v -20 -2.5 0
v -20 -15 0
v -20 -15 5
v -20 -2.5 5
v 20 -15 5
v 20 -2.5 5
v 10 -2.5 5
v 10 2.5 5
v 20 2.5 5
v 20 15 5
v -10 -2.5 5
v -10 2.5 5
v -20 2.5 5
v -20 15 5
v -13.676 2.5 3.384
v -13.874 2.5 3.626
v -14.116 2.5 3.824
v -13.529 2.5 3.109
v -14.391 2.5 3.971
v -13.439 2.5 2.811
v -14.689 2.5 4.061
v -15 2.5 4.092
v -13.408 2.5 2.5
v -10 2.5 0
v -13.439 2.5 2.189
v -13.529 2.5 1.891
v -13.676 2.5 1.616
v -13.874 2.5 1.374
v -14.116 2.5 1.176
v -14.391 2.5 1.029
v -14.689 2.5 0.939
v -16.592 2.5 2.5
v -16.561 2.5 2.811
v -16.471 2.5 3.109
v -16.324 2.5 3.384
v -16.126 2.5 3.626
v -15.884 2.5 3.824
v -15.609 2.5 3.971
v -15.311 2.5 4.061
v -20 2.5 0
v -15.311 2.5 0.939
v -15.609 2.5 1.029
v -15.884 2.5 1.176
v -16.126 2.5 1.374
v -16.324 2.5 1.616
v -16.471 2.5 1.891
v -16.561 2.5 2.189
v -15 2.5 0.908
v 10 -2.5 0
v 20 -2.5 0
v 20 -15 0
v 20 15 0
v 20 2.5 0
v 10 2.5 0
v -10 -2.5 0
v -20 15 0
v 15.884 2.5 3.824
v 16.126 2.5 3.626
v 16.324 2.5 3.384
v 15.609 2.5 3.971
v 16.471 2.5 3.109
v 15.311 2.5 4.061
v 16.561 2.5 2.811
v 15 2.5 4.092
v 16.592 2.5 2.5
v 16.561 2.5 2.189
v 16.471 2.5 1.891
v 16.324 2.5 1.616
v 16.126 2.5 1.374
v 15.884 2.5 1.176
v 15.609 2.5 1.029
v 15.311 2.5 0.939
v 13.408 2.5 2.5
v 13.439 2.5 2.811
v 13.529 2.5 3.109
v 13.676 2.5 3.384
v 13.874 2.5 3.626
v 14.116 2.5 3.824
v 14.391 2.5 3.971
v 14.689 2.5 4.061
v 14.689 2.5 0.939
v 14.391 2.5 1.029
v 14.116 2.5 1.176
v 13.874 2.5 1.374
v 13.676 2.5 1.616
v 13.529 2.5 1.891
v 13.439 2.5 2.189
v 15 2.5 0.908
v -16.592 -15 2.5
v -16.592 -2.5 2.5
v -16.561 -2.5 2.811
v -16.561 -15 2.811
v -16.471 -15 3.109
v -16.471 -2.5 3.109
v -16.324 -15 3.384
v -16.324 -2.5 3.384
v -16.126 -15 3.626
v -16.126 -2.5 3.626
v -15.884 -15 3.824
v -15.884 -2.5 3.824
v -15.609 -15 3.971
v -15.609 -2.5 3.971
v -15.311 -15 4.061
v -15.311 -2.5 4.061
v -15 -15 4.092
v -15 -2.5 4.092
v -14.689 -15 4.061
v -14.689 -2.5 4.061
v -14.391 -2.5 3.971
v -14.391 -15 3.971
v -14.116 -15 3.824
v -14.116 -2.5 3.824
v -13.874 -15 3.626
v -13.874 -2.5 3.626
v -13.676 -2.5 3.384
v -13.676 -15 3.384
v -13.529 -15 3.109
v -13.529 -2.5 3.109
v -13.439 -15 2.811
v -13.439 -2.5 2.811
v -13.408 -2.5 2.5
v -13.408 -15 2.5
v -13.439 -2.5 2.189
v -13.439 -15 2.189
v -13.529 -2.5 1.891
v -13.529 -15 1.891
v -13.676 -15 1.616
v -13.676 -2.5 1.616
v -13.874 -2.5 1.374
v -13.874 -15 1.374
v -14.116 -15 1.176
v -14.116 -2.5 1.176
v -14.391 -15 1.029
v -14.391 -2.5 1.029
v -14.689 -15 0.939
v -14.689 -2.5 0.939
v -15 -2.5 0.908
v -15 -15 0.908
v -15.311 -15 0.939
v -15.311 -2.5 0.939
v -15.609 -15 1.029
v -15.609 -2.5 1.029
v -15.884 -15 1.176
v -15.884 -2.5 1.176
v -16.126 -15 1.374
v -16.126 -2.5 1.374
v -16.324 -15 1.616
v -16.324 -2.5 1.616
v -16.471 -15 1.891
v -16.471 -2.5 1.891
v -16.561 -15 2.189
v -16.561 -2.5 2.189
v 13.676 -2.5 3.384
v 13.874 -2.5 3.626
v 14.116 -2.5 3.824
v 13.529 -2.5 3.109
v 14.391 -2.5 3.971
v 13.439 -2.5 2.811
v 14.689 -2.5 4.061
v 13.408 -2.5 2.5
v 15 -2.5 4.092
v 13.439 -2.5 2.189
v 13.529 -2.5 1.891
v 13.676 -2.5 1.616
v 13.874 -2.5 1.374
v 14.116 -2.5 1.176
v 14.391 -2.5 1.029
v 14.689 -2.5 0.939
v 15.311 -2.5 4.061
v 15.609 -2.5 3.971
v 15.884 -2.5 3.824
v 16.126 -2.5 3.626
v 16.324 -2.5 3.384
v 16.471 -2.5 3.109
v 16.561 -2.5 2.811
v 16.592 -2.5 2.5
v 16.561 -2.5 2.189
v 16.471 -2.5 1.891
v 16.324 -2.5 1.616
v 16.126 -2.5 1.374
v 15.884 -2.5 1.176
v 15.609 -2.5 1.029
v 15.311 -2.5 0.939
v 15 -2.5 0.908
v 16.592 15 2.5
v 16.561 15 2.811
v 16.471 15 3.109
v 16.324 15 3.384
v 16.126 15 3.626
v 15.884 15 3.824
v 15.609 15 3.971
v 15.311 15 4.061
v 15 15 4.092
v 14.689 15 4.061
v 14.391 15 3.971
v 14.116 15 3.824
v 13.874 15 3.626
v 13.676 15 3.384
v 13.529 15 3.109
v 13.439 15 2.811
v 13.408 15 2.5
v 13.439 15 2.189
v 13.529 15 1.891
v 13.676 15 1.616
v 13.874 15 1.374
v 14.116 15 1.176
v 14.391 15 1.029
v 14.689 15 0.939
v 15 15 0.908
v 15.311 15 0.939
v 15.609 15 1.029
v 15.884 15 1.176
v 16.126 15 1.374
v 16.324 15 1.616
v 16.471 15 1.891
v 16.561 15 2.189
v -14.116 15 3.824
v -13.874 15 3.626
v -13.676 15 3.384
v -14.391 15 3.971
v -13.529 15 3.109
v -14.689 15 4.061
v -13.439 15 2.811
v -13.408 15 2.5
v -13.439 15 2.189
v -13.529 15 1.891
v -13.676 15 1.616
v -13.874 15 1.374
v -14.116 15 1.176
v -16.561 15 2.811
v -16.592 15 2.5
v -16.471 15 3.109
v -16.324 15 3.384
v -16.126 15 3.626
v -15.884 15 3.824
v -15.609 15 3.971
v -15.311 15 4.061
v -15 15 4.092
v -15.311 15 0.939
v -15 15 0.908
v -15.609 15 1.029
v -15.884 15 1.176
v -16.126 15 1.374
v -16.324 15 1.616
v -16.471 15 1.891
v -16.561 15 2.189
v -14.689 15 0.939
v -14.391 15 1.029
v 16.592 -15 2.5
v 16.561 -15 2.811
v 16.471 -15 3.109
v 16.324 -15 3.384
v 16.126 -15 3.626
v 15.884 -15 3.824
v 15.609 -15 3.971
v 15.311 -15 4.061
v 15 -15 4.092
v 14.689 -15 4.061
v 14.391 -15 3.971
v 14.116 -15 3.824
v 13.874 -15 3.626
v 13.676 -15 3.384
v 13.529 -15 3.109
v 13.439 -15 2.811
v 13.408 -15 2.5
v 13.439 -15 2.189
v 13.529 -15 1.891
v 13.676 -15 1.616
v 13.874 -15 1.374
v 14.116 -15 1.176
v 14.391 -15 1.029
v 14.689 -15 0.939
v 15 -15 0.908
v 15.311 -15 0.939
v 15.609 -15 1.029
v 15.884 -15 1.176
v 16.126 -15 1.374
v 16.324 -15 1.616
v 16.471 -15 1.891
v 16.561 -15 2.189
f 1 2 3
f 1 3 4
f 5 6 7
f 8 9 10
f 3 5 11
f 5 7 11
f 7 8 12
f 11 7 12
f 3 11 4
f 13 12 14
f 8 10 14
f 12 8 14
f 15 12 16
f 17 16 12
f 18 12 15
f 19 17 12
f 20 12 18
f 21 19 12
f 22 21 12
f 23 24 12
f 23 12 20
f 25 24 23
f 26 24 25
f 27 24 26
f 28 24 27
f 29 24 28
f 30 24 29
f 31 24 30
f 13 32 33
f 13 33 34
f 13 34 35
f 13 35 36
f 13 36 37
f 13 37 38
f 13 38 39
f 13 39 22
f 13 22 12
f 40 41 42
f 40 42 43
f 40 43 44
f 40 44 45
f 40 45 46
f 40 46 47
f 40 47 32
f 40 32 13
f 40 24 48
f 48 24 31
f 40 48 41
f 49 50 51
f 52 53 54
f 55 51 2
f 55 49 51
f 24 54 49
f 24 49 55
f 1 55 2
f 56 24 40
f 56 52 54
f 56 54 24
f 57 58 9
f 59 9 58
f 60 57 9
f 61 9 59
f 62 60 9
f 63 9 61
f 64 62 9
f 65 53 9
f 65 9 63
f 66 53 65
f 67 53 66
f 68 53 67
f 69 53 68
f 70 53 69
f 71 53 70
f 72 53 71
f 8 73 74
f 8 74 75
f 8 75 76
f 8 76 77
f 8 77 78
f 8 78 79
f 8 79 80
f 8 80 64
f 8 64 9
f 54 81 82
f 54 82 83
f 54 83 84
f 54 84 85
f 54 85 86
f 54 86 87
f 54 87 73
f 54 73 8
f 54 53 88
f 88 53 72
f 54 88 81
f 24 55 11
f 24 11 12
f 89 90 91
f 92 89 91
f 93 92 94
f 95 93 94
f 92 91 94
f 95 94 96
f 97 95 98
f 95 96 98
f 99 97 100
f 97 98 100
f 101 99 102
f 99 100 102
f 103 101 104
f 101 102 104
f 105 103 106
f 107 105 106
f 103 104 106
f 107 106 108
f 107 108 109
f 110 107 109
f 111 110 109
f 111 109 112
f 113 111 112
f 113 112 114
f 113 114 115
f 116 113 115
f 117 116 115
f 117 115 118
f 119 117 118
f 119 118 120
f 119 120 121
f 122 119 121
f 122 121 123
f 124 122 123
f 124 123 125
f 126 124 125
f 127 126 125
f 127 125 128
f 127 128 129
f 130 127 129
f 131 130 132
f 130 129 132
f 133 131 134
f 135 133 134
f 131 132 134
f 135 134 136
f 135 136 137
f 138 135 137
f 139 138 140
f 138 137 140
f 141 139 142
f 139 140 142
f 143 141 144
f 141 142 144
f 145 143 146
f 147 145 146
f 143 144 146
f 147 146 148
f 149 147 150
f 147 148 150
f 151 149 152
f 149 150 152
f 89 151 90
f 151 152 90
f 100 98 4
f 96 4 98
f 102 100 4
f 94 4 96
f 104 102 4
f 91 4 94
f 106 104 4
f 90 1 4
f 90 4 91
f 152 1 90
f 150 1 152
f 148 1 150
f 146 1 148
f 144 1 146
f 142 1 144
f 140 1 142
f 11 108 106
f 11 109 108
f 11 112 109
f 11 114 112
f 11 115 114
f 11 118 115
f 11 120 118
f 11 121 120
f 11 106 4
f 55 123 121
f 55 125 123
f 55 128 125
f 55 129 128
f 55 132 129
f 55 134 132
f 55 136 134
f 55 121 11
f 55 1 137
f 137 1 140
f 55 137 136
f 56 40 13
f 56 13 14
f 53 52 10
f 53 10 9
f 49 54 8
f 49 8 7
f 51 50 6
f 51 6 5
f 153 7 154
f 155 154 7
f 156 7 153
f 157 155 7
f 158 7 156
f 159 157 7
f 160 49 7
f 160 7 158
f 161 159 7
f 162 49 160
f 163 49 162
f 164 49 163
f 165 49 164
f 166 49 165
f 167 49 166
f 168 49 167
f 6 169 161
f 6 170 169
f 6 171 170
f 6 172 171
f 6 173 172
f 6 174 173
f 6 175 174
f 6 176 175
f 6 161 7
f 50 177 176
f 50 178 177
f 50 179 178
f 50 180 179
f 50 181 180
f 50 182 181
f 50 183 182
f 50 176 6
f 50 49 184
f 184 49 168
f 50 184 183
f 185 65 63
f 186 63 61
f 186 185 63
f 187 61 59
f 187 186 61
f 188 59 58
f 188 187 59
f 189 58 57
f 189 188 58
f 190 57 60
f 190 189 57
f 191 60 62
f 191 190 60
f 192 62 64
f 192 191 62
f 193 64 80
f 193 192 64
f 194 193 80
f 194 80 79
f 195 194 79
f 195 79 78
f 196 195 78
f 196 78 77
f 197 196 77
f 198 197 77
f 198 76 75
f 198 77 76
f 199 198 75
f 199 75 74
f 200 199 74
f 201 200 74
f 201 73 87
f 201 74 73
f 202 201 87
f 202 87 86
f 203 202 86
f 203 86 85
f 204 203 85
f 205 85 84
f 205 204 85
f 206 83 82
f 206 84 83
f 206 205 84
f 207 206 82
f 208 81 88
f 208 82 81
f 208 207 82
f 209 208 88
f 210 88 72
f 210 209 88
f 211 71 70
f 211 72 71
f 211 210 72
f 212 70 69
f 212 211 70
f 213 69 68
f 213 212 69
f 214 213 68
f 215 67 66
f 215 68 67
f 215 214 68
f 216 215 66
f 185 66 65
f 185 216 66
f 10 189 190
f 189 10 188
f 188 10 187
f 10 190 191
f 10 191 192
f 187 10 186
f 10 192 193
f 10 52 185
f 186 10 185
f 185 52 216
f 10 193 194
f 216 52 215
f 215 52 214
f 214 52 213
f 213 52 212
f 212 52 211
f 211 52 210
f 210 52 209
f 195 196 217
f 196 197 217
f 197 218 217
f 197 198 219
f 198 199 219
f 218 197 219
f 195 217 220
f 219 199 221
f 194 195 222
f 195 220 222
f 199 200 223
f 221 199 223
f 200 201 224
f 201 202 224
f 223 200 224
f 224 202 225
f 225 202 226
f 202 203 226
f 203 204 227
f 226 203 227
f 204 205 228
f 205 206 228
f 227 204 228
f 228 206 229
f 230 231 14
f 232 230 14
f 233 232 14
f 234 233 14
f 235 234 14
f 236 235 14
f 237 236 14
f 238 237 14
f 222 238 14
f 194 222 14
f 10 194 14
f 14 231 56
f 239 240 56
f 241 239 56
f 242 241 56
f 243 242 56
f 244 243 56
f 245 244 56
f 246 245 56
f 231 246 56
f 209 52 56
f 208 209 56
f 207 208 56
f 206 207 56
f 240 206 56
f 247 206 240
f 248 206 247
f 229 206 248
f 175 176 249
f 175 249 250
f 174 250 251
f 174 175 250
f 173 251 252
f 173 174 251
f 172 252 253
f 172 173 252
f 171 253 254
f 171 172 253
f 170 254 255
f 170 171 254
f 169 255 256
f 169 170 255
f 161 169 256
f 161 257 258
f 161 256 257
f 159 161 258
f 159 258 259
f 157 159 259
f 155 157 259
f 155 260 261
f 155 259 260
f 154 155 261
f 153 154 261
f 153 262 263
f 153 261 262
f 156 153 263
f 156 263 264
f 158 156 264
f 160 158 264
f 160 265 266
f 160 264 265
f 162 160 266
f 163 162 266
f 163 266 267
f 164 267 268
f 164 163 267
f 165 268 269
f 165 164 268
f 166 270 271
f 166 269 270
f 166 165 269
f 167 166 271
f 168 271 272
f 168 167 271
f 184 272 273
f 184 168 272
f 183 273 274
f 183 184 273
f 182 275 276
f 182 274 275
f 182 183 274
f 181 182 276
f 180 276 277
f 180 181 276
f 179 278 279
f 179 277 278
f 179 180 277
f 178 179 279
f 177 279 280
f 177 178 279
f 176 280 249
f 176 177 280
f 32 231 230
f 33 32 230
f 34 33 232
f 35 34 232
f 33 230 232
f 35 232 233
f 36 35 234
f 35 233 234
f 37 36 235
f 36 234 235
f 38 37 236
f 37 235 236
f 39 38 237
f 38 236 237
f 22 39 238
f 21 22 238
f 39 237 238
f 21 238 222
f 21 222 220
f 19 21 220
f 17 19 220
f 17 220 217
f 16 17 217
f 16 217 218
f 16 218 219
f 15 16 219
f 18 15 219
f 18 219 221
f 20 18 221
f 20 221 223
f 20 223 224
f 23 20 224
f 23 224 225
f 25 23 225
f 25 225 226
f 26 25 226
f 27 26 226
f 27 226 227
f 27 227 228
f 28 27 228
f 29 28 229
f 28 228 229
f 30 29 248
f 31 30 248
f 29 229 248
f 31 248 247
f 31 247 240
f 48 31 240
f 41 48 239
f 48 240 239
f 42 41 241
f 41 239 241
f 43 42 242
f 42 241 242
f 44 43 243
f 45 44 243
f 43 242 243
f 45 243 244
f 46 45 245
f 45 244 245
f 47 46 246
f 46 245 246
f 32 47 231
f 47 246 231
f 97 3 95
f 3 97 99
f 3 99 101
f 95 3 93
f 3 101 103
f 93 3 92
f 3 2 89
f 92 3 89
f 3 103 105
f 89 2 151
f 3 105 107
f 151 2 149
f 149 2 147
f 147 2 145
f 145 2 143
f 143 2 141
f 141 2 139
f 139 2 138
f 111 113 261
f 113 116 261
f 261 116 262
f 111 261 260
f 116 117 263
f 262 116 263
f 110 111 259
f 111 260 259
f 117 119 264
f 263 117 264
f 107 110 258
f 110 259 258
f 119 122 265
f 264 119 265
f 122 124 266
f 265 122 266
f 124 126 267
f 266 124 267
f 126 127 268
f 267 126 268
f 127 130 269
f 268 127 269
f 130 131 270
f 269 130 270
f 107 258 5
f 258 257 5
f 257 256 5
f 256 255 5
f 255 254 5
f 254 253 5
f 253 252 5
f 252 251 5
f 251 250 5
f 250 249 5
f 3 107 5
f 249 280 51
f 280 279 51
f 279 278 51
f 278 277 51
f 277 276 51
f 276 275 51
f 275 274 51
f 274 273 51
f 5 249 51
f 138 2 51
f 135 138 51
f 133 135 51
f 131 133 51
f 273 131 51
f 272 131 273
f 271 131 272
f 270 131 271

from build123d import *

# Parameters (mm, degrees)
BOSS_EXTRUDE1_DEPTH = 5
SKETCH2_R           = 1.591812525
CUT_EXTRUDE1_DEPTH  = 37.400549446


with BuildPart() as part:
    # Sketch1 → Boss-Extrude1 (new body)
    with BuildSketch(Plane.XY):
        Polygon((-15, 15), (15, 15), (20, 15), (20, 2.5), (10, 2.5), (10, -2.5), (20, -2.5), (20, -15), (15, -15), (-15, -15), (-20, -15), (-20, -2.5), (-10, -2.5), (-10, 2.5), (-20, 2.5), (-20, 15), align=None)
    extrude(amount=BOSS_EXTRUDE1_DEPTH)

    # Sketch2 → Cut-Extrude1 (cut, through all)
    with BuildSketch(Plane(origin=(0, 15, 0), x_dir=(1, 0, 0), z_dir=(0, 1, 0))):
        with Locations(Location((-15, -2.5, 0), (0, 0, 180))):
            Circle(SKETCH2_R)
    cut_extrude1 = extrude(amount=-CUT_EXTRUDE1_DEPTH, mode=Mode.SUBTRACT)

    # Mirror1: Cut-Extrude1 across plane
    add(cut_extrude1.mirror(Plane(origin=(0, 0, 0), x_dir=(0, 0, 1), z_dir=(1, 0, 0))), mode=Mode.SUBTRACT)


solid = part.part
